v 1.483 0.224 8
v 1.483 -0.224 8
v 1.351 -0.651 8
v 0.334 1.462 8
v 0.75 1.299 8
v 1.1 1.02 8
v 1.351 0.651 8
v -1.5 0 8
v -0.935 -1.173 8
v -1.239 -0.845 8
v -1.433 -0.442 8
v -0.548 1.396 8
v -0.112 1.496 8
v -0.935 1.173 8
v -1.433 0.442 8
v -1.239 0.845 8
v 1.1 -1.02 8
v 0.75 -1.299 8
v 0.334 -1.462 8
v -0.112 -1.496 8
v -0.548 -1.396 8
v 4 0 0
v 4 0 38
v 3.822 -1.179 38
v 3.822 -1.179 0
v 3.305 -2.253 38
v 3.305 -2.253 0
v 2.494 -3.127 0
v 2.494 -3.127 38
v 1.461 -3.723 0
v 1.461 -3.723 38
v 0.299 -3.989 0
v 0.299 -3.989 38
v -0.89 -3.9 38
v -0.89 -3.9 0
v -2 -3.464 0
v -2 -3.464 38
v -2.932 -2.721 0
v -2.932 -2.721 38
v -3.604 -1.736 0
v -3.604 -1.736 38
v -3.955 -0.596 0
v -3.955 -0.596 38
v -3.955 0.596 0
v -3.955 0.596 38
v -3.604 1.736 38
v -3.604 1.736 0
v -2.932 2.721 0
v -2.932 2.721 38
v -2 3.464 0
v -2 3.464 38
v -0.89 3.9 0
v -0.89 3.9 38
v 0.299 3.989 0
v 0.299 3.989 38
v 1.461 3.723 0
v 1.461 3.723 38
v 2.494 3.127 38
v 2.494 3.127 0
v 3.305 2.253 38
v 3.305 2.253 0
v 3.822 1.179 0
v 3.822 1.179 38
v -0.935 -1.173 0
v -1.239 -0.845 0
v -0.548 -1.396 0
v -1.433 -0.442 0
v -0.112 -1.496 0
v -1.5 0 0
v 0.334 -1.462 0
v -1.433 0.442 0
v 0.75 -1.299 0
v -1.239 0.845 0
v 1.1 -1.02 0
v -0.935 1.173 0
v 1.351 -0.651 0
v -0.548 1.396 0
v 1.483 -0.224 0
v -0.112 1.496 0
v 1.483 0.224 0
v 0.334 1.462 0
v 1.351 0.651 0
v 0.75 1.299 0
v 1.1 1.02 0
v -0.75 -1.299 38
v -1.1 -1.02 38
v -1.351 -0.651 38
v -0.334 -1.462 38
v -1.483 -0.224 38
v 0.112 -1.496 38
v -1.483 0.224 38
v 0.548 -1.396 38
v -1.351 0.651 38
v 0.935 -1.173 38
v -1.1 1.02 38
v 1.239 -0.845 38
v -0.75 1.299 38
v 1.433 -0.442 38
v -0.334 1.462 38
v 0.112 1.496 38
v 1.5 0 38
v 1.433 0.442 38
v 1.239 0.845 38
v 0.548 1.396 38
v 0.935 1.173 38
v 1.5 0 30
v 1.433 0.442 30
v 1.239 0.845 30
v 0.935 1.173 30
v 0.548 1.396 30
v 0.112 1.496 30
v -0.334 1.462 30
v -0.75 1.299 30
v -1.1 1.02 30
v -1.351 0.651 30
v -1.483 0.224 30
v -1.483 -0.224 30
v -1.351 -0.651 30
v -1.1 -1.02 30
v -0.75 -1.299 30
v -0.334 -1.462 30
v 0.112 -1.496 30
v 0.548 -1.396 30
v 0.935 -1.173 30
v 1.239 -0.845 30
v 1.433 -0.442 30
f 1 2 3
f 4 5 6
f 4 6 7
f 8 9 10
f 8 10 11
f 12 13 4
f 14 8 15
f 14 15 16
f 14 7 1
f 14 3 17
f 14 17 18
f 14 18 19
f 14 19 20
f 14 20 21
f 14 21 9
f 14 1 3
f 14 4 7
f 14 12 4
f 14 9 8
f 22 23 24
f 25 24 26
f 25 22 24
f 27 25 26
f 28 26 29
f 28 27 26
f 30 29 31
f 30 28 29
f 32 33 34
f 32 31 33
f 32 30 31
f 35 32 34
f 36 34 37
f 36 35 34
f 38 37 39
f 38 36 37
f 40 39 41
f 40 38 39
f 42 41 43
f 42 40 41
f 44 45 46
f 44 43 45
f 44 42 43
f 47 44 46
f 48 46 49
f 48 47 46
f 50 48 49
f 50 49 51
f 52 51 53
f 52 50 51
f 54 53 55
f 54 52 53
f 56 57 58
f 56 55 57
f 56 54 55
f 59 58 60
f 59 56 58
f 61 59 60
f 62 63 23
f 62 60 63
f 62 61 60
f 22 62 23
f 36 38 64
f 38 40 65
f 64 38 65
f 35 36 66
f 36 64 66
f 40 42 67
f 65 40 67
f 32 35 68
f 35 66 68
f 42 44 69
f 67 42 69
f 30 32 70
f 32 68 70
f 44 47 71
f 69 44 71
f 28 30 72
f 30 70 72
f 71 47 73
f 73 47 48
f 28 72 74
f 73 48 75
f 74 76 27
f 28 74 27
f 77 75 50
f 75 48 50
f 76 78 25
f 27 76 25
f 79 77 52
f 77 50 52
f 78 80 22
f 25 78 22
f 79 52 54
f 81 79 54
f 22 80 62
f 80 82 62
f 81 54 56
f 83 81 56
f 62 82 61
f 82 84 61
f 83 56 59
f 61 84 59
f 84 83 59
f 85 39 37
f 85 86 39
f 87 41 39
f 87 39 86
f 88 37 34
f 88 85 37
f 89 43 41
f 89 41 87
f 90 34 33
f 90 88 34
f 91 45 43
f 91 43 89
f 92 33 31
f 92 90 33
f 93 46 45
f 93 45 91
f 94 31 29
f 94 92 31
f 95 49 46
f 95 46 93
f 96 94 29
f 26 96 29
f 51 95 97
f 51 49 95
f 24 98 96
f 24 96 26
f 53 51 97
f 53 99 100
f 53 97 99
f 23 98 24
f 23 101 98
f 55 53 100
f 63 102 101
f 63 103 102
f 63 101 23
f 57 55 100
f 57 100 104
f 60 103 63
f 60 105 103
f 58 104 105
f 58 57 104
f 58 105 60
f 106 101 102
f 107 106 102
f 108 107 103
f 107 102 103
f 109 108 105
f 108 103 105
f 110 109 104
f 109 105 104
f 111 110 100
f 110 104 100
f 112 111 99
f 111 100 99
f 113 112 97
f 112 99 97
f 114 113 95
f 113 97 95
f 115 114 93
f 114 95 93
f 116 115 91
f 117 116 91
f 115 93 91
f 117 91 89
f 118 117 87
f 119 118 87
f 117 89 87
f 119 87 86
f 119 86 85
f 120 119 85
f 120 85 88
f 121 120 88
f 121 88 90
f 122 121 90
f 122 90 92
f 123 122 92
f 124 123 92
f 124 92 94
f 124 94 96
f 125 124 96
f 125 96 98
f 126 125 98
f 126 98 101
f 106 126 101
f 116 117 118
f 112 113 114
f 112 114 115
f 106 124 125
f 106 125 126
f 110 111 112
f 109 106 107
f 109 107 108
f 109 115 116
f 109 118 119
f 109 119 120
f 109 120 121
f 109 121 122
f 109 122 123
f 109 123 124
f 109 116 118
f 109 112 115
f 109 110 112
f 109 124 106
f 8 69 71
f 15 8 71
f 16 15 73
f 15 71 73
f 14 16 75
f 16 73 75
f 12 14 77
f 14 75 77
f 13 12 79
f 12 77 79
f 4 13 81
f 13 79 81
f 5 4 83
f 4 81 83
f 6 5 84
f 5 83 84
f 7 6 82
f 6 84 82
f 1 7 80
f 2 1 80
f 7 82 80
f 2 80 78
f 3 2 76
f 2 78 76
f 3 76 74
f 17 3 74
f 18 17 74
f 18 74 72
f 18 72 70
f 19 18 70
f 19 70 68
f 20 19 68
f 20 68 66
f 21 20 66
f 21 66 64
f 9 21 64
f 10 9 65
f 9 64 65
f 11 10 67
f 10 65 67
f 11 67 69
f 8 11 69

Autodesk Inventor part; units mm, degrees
ref_plane "YZ Plane" through (0, 0, 0) normal (1, 0, 0) x (0, 1, 0)
ref_plane "XZ Plane" through (0, 0, 0) normal (0, 1, 0) x (-1, 0, 0)
ref_plane "XY Plane" through (0, 0, 0) normal (0, 0, 1) x (1, 0, 0)
sketch "スケッチ1" plane through (0, 0, 0) normal (0, 0, 1) x (1, 0, 0)
  circle A0 centre (0, 0) radius 4
  circle A1 centre (0, 0) radius 2
  dimension "d0" = 8
  dimension "d1" = 4
extrude "押し出し1" add sketch "スケッチ1" along normal blind 38 contours A0 | A1
sketch "スケッチ2" plane through (0, 0, 38) normal (0, 0, 1) x (1, 0, 0)
  circle A0 centre (0, 0) radius 1.5
  dimension "d4" = 3
extrude "押し出し2" cut sketch "スケッチ2" against normal blind 8
sketch "スケッチ3" plane through (0, 0, 0) normal (0, 0, -1) x (-1, 0, 0)
  circle A0 centre (0, 0) radius 1.5
  dimension "d7" = 3
extrude "押し出し3" cut sketch "スケッチ3" against normal blind 8
properties part number "スペーサーm3,38,Φ8,自作" material "アルミニウム 7075"
